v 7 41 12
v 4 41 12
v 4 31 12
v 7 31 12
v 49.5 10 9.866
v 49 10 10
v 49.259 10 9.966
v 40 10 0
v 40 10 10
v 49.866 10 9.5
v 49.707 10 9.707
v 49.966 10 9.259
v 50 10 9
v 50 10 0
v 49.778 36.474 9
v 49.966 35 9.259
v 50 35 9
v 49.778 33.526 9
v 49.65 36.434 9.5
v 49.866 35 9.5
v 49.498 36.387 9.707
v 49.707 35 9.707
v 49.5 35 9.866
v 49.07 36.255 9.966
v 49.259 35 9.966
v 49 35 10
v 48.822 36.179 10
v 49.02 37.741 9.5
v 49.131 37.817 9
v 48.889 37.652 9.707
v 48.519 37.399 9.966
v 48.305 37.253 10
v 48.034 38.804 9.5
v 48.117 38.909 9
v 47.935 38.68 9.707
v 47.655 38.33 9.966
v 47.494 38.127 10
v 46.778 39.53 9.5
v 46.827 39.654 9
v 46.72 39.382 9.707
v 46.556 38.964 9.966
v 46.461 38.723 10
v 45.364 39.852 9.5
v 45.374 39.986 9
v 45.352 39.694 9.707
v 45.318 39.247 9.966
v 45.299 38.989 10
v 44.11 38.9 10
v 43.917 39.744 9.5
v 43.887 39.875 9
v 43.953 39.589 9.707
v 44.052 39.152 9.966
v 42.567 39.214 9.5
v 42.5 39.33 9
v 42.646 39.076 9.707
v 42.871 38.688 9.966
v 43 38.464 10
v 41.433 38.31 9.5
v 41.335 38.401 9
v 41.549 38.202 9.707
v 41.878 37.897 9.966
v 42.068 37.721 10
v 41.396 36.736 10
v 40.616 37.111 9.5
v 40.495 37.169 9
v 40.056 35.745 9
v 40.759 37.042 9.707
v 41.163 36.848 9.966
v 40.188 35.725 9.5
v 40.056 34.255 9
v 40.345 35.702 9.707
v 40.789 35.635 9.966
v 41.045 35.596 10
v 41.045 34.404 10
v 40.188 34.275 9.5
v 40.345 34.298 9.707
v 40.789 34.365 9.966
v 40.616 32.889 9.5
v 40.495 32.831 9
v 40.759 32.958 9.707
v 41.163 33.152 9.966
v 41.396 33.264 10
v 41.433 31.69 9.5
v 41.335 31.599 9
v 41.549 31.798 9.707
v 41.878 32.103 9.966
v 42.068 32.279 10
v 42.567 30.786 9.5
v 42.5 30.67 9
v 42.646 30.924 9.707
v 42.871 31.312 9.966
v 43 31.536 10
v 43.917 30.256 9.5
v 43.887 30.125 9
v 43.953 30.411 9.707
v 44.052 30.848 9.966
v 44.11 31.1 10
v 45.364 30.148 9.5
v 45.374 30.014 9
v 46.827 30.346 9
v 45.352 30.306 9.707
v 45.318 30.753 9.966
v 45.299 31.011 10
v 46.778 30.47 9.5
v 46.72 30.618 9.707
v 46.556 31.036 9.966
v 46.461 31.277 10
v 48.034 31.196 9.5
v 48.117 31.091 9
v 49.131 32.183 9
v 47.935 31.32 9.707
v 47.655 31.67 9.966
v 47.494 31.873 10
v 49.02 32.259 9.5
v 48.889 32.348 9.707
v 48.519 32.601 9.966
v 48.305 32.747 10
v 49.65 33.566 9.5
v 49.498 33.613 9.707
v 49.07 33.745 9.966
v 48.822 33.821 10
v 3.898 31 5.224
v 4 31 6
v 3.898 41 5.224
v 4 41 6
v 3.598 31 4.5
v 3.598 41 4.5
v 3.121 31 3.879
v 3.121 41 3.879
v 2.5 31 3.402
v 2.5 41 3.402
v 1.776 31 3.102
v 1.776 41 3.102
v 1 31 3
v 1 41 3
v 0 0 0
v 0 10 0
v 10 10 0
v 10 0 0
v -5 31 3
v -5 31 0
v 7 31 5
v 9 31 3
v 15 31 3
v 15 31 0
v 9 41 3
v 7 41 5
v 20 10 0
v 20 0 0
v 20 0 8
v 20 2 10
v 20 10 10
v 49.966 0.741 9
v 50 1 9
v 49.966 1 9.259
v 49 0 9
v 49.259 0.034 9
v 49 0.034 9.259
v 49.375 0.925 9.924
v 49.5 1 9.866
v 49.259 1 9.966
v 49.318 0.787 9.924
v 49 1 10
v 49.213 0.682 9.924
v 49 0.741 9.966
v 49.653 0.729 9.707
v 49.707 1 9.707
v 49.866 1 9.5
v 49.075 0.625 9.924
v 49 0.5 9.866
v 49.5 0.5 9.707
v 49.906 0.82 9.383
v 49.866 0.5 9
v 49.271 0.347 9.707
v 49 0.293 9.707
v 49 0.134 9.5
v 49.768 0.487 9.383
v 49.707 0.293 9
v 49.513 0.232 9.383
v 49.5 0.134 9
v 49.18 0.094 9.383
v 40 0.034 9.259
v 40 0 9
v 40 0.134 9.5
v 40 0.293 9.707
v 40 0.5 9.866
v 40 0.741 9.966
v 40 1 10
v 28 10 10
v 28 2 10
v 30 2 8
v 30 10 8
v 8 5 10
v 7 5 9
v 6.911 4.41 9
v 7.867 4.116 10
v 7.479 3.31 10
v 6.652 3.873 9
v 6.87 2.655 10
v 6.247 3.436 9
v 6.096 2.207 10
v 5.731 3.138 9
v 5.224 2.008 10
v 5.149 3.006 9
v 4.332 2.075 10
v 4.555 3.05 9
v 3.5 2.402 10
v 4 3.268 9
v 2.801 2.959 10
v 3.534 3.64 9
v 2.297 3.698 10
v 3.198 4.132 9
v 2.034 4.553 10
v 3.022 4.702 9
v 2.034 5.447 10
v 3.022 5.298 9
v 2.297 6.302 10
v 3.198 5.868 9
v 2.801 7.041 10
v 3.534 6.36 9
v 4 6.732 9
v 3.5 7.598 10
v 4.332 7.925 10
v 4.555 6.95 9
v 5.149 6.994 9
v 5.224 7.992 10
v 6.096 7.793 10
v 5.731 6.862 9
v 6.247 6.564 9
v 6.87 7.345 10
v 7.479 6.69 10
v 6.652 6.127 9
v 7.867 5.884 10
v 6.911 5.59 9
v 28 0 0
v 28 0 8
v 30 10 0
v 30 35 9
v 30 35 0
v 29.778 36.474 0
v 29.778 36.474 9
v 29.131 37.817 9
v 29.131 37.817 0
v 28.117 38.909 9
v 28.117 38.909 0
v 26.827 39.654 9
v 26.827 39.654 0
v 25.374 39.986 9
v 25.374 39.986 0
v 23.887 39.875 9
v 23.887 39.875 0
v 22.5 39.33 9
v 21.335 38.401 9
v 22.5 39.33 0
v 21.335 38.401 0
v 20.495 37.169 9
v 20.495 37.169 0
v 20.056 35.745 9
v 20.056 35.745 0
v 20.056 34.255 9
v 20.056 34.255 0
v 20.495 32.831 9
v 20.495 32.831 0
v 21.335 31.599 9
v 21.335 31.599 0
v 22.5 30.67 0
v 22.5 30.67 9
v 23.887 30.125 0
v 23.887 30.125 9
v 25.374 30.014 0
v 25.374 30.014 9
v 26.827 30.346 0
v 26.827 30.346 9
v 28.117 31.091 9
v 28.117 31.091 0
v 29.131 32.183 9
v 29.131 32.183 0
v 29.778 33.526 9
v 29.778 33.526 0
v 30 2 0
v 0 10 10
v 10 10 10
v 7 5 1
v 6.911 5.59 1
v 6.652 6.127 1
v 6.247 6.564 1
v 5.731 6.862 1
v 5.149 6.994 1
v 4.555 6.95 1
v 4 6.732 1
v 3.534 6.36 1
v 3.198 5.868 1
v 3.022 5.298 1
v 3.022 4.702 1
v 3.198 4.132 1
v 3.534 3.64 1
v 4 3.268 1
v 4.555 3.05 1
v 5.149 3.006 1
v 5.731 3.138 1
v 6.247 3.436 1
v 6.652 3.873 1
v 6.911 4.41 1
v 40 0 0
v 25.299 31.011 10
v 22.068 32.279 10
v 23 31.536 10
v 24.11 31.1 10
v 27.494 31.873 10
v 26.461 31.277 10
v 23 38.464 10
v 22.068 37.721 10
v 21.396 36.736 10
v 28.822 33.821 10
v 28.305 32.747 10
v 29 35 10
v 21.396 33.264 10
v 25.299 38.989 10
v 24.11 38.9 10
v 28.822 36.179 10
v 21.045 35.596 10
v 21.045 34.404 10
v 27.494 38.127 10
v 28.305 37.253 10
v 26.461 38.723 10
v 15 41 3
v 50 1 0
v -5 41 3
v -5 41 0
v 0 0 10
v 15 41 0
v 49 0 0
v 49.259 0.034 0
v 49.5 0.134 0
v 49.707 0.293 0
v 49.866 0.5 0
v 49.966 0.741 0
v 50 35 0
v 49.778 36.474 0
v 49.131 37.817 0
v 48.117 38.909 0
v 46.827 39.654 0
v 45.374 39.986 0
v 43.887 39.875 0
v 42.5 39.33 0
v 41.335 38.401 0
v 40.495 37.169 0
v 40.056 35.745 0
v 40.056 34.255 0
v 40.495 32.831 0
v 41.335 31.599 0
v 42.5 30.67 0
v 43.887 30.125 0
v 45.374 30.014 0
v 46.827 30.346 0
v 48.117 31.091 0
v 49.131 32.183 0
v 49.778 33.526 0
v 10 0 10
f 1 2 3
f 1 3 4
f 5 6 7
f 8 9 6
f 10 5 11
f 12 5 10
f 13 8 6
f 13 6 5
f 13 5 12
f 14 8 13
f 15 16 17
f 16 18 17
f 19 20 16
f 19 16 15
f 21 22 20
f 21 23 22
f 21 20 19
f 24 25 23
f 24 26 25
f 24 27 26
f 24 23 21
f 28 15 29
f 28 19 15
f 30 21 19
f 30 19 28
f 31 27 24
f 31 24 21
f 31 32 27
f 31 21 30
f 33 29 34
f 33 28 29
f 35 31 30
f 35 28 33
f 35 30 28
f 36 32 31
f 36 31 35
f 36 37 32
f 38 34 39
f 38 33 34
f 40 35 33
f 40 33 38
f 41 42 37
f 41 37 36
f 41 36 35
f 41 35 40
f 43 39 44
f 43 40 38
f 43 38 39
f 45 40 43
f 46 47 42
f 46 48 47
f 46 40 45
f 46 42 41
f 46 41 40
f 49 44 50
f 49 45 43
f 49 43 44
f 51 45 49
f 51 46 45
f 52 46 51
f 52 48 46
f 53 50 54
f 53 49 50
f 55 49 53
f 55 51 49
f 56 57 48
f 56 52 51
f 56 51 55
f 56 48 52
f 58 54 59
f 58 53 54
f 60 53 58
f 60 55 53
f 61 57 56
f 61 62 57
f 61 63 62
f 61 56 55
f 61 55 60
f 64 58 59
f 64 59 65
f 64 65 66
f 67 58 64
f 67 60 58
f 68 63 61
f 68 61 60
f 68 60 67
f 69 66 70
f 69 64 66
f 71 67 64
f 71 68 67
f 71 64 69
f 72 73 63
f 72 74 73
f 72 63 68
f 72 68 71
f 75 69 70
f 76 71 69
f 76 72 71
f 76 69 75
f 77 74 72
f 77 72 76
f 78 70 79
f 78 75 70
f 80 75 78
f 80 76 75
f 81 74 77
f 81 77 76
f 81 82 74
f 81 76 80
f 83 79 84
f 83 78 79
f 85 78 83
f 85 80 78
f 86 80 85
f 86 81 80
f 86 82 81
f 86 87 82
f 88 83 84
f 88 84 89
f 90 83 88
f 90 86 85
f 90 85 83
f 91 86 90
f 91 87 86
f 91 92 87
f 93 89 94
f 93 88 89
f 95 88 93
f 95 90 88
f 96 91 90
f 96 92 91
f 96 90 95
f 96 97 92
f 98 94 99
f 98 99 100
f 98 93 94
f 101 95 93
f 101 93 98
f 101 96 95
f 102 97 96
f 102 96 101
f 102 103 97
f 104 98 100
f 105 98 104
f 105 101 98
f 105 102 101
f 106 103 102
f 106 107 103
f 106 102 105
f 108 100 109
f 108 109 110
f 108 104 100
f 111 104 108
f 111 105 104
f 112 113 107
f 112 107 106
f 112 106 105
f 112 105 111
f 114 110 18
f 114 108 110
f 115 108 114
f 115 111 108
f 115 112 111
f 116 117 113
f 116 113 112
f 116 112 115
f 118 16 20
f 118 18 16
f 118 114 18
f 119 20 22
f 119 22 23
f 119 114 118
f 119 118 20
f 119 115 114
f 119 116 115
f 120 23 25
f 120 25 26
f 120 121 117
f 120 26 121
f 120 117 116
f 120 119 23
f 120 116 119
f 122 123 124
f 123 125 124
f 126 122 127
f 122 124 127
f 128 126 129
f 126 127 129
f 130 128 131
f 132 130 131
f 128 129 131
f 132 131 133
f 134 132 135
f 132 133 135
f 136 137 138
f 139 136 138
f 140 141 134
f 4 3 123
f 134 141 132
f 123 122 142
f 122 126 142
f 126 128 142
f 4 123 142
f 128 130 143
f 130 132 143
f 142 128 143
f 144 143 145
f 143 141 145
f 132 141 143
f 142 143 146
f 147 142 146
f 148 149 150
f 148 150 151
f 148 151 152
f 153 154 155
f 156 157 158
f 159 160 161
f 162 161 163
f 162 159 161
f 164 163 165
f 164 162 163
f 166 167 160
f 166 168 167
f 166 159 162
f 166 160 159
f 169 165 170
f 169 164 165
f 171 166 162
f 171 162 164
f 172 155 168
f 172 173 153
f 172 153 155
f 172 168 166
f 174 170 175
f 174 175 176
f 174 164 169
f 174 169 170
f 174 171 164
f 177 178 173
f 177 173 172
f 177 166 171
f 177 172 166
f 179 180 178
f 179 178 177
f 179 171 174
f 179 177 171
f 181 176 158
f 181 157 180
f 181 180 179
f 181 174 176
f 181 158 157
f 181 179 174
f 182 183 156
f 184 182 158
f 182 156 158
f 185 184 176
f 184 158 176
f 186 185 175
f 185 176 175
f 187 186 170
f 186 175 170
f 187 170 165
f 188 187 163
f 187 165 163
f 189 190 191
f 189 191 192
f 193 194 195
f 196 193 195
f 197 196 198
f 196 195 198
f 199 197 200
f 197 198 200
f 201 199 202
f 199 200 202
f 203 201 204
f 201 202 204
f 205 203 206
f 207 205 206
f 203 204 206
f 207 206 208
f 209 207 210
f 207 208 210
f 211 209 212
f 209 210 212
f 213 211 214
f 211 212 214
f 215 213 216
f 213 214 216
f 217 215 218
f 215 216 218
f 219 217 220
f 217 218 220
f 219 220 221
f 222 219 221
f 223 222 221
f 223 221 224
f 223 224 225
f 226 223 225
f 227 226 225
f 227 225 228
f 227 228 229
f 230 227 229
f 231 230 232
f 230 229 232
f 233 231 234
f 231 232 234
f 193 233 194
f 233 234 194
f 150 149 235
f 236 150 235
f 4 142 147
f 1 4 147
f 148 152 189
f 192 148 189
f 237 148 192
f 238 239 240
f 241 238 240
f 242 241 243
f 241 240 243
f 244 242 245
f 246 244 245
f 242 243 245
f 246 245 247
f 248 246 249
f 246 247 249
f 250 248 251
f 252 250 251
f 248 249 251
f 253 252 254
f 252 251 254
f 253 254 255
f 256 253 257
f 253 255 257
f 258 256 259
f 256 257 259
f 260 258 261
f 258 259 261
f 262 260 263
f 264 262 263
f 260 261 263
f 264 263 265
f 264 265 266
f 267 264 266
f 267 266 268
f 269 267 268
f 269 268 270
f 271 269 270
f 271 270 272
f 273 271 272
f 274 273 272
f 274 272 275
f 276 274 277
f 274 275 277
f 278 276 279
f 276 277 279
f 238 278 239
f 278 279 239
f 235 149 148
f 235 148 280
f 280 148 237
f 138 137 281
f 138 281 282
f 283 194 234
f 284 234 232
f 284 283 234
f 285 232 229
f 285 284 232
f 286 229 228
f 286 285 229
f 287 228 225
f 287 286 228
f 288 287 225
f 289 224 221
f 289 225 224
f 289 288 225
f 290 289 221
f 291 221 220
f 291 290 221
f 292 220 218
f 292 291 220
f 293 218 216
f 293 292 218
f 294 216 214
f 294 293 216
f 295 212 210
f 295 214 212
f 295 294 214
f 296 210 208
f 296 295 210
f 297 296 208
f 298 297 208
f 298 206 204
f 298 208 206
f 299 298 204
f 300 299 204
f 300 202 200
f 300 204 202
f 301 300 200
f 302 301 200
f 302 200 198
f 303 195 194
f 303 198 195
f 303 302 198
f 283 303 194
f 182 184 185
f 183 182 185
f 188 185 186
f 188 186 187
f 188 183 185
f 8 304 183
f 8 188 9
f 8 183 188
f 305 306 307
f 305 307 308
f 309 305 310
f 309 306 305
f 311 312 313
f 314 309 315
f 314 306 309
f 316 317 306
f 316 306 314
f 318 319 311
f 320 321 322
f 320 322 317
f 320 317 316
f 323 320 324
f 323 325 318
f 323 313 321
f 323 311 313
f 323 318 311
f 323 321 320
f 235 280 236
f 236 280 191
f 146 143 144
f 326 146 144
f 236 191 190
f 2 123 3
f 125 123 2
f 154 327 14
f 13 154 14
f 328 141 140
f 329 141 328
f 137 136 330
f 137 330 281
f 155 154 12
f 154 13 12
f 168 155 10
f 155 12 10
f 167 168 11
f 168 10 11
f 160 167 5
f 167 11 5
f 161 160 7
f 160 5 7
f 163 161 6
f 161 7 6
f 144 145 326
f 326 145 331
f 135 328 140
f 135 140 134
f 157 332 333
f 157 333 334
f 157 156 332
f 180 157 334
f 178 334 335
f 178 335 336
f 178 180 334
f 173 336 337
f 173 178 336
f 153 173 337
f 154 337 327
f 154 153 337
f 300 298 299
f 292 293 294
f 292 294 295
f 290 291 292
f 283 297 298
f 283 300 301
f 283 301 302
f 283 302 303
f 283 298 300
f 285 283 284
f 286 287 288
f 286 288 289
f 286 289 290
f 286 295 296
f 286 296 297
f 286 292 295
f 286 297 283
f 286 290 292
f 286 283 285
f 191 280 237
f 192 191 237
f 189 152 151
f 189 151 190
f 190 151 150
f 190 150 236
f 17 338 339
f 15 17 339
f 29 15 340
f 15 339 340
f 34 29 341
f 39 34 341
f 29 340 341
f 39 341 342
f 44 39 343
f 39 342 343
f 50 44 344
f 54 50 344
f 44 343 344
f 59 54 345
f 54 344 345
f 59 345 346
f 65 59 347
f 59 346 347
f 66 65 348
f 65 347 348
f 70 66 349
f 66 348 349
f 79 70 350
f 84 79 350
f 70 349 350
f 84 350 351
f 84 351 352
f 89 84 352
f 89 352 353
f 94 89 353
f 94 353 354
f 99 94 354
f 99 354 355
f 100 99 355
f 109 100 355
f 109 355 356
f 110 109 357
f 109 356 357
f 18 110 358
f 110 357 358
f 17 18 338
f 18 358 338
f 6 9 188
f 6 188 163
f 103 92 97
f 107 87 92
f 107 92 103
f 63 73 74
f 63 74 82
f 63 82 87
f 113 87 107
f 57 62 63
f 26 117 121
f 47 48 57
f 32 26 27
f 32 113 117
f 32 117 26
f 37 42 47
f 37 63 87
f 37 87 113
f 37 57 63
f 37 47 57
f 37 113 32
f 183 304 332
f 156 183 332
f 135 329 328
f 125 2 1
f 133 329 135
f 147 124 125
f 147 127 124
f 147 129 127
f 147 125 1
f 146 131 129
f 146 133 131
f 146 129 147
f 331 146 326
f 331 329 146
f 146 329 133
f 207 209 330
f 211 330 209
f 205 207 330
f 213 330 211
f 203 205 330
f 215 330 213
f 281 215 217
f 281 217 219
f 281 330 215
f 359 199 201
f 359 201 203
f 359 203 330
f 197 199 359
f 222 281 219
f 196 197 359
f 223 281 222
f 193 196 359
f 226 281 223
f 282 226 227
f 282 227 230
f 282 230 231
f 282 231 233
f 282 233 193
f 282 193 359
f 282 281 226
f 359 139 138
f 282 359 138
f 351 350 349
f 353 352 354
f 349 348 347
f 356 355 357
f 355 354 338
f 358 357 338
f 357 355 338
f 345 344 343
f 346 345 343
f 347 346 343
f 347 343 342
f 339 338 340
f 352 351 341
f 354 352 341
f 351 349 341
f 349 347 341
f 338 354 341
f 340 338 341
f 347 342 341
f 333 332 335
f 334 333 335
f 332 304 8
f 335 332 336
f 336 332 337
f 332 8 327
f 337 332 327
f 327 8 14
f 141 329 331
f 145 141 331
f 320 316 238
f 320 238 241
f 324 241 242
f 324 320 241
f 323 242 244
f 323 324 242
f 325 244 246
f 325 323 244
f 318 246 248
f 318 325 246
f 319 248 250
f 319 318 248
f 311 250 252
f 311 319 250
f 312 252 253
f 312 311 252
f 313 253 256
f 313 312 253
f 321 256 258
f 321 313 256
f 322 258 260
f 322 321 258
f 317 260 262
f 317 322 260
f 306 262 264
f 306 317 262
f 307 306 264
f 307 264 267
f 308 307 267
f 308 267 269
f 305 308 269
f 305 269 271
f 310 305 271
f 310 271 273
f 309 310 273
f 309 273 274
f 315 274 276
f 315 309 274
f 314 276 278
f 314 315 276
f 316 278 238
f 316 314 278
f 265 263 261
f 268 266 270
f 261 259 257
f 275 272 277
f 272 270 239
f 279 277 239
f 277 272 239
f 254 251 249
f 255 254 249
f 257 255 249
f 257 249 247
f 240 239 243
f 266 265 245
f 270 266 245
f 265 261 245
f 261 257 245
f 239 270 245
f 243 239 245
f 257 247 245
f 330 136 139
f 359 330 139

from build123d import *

# Parameters (mm, degrees)
BOX001_W          = 10
BOX001_H          = 10
BOX001_DEPTH      = 10
FILLET_R          = 1
BOX_W             = 10
BOX_H             = 10
BOX_DEPTH         = 10
CHAMFER_SIZE      = 2
CYLINDER_R        = 2
CYLINDER_DEPTH    = 10
BOX002_W          = 10
BOX002_H          = 10
BOX002_DEPTH      = 10
CHAMFER001_SIZE   = 1
CYLINDER001_R     = 5
CYLINDER001_DEPTH = 10
FILLET001_R       = 1
CYLINDER002_R     = 5
CYLINDER002_DEPTH = 10
CHAMFER002_SIZE   = 1
BOX003_W          = 20
BOX003_H          = 10
BOX003_DEPTH      = 3
BOX004_W          = 3
BOX004_H          = 10
BOX004_DEPTH      = 12
CHAMFER003_SIZE   = 2
FILLET002_R       = 3


with BuildPart() as fillet_body:
    # Box001 → Box001 (new body)
    with BuildSketch(Plane(origin=(40, 0, 0), x_dir=(1, 0, 0), z_dir=(0, 0, 1))):
        with Locations((5, 5)):
            Rectangle(BOX001_W, BOX001_H)
    extrude(amount=BOX001_DEPTH)

    # Fillet
    fillet_edges = [fillet_body.edges().sort_by_distance(p)[0] for p in [
        (50, 0, 5),
        (50, 5, 10),
        (45, 0, 10),
    ]]
    fillet(fillet_edges, radius=FILLET_R)


with BuildPart() as chamfer_body:
    # Box → Box (new body)
    with BuildSketch(Plane(origin=(20, 0, 0), x_dir=(1, 0, 0), z_dir=(0, 0, 1))):
        with Locations((5, 5)):
            Rectangle(BOX_W, BOX_H)
    extrude(amount=BOX_DEPTH)

    # Chamfer
    chamfer_edges = [chamfer_body.edges().sort_by_distance(p)[0] for p in [
        (30, 0, 5),
        (30, 5, 10),
        (25, 0, 10),
    ]]
    chamfer(chamfer_edges, length=CHAMFER_SIZE)


with BuildPart() as cylinder:
    # Cylinder → Cylinder (new body)
    with BuildSketch(Plane.XY.offset(1)):
        Circle(CYLINDER_R)
    extrude(amount=CYLINDER_DEPTH)


with BuildPart() as chamfer001:
    # Box002 → Box002 (new body)
    with BuildSketch(Plane(origin=(-5, -5, 0), x_dir=(1, 0, 0), z_dir=(0, 0, 1))):
        with Locations((5, 5)):
            Rectangle(BOX002_W, BOX002_H)
    extrude(amount=BOX002_DEPTH)

    # Cut: cut Cylinder
    add(cylinder.part, mode=Mode.SUBTRACT)


with BuildPart() as chamfer001_1:
    # Cut placement: moved
    add(chamfer001.part.moved(Location((5, 5, 0))))

    # Chamfer001
    chamfer001_edges = [chamfer001_1.edges().sort_by_distance(p)[0] for p in [
        (3, 5, 10),
    ]]
    chamfer(chamfer001_edges, length=CHAMFER001_SIZE)


with BuildPart() as fillet001:
    # Cylinder001 → Cylinder001 (new body)
    with BuildSketch(Plane(origin=(45, 35, 0), x_dir=(1, 0, 0), z_dir=(0, 0, 1))):
        Circle(CYLINDER001_R)
    extrude(amount=CYLINDER001_DEPTH)

    # Fillet001
    fillet001_edges = [fillet001.edges().sort_by_distance(p)[0] for p in [
        (40, 35, 10),
    ]]
    fillet(fillet001_edges, radius=FILLET001_R)


with BuildPart() as chamfer002:
    # Cylinder002 → Cylinder002 (new body)
    with BuildSketch(Plane(origin=(25, 35, 0), x_dir=(1, 0, 0), z_dir=(0, 0, 1))):
        Circle(CYLINDER002_R)
    extrude(amount=CYLINDER002_DEPTH)

    # Chamfer002
    chamfer002_edges = [chamfer002.edges().sort_by_distance(p)[0] for p in [
        (20, 35, 10),
    ]]
    chamfer(chamfer002_edges, length=CHAMFER002_SIZE)


with BuildPart() as base:
    # Box003 → Box003 (new body)
    with BuildSketch(Plane.XY):
        with Locations((10, 5)):
            Rectangle(BOX003_W, BOX003_H)
    extrude(amount=BOX003_DEPTH)


with BuildPart() as fillet002:
    # Box004 → Box004 (new body)
    with BuildSketch(Plane(origin=(9, 0, 0), x_dir=(1, 0, 0), z_dir=(0, 0, 1))):
        with Locations((1.5, 5)):
            Rectangle(BOX004_W, BOX004_H)
    extrude(amount=BOX004_DEPTH)

    # Fusion: union base
    add(base.part)


with BuildPart() as fillet002_1:
    # Fusion placement: moved
    add(fillet002.part.moved(Location((-5, 31, 0))))

    # Chamfer003
    chamfer003_edges = [fillet002_1.edges().sort_by_distance(p)[0] for p in [
        (7, 36, 3),
    ]]
    chamfer(chamfer003_edges, length=CHAMFER003_SIZE)

    # Fillet002
    fillet002_edges = [fillet002_1.edges().sort_by_distance(p)[0] for p in [
        (4, 36, 3),
    ]]
    fillet(fillet002_edges, radius=FILLET002_R)


solid = Compound([fillet_body.part, chamfer_body.part, chamfer001_1.part, fillet001.part, chamfer002.part, fillet002_1.part])
